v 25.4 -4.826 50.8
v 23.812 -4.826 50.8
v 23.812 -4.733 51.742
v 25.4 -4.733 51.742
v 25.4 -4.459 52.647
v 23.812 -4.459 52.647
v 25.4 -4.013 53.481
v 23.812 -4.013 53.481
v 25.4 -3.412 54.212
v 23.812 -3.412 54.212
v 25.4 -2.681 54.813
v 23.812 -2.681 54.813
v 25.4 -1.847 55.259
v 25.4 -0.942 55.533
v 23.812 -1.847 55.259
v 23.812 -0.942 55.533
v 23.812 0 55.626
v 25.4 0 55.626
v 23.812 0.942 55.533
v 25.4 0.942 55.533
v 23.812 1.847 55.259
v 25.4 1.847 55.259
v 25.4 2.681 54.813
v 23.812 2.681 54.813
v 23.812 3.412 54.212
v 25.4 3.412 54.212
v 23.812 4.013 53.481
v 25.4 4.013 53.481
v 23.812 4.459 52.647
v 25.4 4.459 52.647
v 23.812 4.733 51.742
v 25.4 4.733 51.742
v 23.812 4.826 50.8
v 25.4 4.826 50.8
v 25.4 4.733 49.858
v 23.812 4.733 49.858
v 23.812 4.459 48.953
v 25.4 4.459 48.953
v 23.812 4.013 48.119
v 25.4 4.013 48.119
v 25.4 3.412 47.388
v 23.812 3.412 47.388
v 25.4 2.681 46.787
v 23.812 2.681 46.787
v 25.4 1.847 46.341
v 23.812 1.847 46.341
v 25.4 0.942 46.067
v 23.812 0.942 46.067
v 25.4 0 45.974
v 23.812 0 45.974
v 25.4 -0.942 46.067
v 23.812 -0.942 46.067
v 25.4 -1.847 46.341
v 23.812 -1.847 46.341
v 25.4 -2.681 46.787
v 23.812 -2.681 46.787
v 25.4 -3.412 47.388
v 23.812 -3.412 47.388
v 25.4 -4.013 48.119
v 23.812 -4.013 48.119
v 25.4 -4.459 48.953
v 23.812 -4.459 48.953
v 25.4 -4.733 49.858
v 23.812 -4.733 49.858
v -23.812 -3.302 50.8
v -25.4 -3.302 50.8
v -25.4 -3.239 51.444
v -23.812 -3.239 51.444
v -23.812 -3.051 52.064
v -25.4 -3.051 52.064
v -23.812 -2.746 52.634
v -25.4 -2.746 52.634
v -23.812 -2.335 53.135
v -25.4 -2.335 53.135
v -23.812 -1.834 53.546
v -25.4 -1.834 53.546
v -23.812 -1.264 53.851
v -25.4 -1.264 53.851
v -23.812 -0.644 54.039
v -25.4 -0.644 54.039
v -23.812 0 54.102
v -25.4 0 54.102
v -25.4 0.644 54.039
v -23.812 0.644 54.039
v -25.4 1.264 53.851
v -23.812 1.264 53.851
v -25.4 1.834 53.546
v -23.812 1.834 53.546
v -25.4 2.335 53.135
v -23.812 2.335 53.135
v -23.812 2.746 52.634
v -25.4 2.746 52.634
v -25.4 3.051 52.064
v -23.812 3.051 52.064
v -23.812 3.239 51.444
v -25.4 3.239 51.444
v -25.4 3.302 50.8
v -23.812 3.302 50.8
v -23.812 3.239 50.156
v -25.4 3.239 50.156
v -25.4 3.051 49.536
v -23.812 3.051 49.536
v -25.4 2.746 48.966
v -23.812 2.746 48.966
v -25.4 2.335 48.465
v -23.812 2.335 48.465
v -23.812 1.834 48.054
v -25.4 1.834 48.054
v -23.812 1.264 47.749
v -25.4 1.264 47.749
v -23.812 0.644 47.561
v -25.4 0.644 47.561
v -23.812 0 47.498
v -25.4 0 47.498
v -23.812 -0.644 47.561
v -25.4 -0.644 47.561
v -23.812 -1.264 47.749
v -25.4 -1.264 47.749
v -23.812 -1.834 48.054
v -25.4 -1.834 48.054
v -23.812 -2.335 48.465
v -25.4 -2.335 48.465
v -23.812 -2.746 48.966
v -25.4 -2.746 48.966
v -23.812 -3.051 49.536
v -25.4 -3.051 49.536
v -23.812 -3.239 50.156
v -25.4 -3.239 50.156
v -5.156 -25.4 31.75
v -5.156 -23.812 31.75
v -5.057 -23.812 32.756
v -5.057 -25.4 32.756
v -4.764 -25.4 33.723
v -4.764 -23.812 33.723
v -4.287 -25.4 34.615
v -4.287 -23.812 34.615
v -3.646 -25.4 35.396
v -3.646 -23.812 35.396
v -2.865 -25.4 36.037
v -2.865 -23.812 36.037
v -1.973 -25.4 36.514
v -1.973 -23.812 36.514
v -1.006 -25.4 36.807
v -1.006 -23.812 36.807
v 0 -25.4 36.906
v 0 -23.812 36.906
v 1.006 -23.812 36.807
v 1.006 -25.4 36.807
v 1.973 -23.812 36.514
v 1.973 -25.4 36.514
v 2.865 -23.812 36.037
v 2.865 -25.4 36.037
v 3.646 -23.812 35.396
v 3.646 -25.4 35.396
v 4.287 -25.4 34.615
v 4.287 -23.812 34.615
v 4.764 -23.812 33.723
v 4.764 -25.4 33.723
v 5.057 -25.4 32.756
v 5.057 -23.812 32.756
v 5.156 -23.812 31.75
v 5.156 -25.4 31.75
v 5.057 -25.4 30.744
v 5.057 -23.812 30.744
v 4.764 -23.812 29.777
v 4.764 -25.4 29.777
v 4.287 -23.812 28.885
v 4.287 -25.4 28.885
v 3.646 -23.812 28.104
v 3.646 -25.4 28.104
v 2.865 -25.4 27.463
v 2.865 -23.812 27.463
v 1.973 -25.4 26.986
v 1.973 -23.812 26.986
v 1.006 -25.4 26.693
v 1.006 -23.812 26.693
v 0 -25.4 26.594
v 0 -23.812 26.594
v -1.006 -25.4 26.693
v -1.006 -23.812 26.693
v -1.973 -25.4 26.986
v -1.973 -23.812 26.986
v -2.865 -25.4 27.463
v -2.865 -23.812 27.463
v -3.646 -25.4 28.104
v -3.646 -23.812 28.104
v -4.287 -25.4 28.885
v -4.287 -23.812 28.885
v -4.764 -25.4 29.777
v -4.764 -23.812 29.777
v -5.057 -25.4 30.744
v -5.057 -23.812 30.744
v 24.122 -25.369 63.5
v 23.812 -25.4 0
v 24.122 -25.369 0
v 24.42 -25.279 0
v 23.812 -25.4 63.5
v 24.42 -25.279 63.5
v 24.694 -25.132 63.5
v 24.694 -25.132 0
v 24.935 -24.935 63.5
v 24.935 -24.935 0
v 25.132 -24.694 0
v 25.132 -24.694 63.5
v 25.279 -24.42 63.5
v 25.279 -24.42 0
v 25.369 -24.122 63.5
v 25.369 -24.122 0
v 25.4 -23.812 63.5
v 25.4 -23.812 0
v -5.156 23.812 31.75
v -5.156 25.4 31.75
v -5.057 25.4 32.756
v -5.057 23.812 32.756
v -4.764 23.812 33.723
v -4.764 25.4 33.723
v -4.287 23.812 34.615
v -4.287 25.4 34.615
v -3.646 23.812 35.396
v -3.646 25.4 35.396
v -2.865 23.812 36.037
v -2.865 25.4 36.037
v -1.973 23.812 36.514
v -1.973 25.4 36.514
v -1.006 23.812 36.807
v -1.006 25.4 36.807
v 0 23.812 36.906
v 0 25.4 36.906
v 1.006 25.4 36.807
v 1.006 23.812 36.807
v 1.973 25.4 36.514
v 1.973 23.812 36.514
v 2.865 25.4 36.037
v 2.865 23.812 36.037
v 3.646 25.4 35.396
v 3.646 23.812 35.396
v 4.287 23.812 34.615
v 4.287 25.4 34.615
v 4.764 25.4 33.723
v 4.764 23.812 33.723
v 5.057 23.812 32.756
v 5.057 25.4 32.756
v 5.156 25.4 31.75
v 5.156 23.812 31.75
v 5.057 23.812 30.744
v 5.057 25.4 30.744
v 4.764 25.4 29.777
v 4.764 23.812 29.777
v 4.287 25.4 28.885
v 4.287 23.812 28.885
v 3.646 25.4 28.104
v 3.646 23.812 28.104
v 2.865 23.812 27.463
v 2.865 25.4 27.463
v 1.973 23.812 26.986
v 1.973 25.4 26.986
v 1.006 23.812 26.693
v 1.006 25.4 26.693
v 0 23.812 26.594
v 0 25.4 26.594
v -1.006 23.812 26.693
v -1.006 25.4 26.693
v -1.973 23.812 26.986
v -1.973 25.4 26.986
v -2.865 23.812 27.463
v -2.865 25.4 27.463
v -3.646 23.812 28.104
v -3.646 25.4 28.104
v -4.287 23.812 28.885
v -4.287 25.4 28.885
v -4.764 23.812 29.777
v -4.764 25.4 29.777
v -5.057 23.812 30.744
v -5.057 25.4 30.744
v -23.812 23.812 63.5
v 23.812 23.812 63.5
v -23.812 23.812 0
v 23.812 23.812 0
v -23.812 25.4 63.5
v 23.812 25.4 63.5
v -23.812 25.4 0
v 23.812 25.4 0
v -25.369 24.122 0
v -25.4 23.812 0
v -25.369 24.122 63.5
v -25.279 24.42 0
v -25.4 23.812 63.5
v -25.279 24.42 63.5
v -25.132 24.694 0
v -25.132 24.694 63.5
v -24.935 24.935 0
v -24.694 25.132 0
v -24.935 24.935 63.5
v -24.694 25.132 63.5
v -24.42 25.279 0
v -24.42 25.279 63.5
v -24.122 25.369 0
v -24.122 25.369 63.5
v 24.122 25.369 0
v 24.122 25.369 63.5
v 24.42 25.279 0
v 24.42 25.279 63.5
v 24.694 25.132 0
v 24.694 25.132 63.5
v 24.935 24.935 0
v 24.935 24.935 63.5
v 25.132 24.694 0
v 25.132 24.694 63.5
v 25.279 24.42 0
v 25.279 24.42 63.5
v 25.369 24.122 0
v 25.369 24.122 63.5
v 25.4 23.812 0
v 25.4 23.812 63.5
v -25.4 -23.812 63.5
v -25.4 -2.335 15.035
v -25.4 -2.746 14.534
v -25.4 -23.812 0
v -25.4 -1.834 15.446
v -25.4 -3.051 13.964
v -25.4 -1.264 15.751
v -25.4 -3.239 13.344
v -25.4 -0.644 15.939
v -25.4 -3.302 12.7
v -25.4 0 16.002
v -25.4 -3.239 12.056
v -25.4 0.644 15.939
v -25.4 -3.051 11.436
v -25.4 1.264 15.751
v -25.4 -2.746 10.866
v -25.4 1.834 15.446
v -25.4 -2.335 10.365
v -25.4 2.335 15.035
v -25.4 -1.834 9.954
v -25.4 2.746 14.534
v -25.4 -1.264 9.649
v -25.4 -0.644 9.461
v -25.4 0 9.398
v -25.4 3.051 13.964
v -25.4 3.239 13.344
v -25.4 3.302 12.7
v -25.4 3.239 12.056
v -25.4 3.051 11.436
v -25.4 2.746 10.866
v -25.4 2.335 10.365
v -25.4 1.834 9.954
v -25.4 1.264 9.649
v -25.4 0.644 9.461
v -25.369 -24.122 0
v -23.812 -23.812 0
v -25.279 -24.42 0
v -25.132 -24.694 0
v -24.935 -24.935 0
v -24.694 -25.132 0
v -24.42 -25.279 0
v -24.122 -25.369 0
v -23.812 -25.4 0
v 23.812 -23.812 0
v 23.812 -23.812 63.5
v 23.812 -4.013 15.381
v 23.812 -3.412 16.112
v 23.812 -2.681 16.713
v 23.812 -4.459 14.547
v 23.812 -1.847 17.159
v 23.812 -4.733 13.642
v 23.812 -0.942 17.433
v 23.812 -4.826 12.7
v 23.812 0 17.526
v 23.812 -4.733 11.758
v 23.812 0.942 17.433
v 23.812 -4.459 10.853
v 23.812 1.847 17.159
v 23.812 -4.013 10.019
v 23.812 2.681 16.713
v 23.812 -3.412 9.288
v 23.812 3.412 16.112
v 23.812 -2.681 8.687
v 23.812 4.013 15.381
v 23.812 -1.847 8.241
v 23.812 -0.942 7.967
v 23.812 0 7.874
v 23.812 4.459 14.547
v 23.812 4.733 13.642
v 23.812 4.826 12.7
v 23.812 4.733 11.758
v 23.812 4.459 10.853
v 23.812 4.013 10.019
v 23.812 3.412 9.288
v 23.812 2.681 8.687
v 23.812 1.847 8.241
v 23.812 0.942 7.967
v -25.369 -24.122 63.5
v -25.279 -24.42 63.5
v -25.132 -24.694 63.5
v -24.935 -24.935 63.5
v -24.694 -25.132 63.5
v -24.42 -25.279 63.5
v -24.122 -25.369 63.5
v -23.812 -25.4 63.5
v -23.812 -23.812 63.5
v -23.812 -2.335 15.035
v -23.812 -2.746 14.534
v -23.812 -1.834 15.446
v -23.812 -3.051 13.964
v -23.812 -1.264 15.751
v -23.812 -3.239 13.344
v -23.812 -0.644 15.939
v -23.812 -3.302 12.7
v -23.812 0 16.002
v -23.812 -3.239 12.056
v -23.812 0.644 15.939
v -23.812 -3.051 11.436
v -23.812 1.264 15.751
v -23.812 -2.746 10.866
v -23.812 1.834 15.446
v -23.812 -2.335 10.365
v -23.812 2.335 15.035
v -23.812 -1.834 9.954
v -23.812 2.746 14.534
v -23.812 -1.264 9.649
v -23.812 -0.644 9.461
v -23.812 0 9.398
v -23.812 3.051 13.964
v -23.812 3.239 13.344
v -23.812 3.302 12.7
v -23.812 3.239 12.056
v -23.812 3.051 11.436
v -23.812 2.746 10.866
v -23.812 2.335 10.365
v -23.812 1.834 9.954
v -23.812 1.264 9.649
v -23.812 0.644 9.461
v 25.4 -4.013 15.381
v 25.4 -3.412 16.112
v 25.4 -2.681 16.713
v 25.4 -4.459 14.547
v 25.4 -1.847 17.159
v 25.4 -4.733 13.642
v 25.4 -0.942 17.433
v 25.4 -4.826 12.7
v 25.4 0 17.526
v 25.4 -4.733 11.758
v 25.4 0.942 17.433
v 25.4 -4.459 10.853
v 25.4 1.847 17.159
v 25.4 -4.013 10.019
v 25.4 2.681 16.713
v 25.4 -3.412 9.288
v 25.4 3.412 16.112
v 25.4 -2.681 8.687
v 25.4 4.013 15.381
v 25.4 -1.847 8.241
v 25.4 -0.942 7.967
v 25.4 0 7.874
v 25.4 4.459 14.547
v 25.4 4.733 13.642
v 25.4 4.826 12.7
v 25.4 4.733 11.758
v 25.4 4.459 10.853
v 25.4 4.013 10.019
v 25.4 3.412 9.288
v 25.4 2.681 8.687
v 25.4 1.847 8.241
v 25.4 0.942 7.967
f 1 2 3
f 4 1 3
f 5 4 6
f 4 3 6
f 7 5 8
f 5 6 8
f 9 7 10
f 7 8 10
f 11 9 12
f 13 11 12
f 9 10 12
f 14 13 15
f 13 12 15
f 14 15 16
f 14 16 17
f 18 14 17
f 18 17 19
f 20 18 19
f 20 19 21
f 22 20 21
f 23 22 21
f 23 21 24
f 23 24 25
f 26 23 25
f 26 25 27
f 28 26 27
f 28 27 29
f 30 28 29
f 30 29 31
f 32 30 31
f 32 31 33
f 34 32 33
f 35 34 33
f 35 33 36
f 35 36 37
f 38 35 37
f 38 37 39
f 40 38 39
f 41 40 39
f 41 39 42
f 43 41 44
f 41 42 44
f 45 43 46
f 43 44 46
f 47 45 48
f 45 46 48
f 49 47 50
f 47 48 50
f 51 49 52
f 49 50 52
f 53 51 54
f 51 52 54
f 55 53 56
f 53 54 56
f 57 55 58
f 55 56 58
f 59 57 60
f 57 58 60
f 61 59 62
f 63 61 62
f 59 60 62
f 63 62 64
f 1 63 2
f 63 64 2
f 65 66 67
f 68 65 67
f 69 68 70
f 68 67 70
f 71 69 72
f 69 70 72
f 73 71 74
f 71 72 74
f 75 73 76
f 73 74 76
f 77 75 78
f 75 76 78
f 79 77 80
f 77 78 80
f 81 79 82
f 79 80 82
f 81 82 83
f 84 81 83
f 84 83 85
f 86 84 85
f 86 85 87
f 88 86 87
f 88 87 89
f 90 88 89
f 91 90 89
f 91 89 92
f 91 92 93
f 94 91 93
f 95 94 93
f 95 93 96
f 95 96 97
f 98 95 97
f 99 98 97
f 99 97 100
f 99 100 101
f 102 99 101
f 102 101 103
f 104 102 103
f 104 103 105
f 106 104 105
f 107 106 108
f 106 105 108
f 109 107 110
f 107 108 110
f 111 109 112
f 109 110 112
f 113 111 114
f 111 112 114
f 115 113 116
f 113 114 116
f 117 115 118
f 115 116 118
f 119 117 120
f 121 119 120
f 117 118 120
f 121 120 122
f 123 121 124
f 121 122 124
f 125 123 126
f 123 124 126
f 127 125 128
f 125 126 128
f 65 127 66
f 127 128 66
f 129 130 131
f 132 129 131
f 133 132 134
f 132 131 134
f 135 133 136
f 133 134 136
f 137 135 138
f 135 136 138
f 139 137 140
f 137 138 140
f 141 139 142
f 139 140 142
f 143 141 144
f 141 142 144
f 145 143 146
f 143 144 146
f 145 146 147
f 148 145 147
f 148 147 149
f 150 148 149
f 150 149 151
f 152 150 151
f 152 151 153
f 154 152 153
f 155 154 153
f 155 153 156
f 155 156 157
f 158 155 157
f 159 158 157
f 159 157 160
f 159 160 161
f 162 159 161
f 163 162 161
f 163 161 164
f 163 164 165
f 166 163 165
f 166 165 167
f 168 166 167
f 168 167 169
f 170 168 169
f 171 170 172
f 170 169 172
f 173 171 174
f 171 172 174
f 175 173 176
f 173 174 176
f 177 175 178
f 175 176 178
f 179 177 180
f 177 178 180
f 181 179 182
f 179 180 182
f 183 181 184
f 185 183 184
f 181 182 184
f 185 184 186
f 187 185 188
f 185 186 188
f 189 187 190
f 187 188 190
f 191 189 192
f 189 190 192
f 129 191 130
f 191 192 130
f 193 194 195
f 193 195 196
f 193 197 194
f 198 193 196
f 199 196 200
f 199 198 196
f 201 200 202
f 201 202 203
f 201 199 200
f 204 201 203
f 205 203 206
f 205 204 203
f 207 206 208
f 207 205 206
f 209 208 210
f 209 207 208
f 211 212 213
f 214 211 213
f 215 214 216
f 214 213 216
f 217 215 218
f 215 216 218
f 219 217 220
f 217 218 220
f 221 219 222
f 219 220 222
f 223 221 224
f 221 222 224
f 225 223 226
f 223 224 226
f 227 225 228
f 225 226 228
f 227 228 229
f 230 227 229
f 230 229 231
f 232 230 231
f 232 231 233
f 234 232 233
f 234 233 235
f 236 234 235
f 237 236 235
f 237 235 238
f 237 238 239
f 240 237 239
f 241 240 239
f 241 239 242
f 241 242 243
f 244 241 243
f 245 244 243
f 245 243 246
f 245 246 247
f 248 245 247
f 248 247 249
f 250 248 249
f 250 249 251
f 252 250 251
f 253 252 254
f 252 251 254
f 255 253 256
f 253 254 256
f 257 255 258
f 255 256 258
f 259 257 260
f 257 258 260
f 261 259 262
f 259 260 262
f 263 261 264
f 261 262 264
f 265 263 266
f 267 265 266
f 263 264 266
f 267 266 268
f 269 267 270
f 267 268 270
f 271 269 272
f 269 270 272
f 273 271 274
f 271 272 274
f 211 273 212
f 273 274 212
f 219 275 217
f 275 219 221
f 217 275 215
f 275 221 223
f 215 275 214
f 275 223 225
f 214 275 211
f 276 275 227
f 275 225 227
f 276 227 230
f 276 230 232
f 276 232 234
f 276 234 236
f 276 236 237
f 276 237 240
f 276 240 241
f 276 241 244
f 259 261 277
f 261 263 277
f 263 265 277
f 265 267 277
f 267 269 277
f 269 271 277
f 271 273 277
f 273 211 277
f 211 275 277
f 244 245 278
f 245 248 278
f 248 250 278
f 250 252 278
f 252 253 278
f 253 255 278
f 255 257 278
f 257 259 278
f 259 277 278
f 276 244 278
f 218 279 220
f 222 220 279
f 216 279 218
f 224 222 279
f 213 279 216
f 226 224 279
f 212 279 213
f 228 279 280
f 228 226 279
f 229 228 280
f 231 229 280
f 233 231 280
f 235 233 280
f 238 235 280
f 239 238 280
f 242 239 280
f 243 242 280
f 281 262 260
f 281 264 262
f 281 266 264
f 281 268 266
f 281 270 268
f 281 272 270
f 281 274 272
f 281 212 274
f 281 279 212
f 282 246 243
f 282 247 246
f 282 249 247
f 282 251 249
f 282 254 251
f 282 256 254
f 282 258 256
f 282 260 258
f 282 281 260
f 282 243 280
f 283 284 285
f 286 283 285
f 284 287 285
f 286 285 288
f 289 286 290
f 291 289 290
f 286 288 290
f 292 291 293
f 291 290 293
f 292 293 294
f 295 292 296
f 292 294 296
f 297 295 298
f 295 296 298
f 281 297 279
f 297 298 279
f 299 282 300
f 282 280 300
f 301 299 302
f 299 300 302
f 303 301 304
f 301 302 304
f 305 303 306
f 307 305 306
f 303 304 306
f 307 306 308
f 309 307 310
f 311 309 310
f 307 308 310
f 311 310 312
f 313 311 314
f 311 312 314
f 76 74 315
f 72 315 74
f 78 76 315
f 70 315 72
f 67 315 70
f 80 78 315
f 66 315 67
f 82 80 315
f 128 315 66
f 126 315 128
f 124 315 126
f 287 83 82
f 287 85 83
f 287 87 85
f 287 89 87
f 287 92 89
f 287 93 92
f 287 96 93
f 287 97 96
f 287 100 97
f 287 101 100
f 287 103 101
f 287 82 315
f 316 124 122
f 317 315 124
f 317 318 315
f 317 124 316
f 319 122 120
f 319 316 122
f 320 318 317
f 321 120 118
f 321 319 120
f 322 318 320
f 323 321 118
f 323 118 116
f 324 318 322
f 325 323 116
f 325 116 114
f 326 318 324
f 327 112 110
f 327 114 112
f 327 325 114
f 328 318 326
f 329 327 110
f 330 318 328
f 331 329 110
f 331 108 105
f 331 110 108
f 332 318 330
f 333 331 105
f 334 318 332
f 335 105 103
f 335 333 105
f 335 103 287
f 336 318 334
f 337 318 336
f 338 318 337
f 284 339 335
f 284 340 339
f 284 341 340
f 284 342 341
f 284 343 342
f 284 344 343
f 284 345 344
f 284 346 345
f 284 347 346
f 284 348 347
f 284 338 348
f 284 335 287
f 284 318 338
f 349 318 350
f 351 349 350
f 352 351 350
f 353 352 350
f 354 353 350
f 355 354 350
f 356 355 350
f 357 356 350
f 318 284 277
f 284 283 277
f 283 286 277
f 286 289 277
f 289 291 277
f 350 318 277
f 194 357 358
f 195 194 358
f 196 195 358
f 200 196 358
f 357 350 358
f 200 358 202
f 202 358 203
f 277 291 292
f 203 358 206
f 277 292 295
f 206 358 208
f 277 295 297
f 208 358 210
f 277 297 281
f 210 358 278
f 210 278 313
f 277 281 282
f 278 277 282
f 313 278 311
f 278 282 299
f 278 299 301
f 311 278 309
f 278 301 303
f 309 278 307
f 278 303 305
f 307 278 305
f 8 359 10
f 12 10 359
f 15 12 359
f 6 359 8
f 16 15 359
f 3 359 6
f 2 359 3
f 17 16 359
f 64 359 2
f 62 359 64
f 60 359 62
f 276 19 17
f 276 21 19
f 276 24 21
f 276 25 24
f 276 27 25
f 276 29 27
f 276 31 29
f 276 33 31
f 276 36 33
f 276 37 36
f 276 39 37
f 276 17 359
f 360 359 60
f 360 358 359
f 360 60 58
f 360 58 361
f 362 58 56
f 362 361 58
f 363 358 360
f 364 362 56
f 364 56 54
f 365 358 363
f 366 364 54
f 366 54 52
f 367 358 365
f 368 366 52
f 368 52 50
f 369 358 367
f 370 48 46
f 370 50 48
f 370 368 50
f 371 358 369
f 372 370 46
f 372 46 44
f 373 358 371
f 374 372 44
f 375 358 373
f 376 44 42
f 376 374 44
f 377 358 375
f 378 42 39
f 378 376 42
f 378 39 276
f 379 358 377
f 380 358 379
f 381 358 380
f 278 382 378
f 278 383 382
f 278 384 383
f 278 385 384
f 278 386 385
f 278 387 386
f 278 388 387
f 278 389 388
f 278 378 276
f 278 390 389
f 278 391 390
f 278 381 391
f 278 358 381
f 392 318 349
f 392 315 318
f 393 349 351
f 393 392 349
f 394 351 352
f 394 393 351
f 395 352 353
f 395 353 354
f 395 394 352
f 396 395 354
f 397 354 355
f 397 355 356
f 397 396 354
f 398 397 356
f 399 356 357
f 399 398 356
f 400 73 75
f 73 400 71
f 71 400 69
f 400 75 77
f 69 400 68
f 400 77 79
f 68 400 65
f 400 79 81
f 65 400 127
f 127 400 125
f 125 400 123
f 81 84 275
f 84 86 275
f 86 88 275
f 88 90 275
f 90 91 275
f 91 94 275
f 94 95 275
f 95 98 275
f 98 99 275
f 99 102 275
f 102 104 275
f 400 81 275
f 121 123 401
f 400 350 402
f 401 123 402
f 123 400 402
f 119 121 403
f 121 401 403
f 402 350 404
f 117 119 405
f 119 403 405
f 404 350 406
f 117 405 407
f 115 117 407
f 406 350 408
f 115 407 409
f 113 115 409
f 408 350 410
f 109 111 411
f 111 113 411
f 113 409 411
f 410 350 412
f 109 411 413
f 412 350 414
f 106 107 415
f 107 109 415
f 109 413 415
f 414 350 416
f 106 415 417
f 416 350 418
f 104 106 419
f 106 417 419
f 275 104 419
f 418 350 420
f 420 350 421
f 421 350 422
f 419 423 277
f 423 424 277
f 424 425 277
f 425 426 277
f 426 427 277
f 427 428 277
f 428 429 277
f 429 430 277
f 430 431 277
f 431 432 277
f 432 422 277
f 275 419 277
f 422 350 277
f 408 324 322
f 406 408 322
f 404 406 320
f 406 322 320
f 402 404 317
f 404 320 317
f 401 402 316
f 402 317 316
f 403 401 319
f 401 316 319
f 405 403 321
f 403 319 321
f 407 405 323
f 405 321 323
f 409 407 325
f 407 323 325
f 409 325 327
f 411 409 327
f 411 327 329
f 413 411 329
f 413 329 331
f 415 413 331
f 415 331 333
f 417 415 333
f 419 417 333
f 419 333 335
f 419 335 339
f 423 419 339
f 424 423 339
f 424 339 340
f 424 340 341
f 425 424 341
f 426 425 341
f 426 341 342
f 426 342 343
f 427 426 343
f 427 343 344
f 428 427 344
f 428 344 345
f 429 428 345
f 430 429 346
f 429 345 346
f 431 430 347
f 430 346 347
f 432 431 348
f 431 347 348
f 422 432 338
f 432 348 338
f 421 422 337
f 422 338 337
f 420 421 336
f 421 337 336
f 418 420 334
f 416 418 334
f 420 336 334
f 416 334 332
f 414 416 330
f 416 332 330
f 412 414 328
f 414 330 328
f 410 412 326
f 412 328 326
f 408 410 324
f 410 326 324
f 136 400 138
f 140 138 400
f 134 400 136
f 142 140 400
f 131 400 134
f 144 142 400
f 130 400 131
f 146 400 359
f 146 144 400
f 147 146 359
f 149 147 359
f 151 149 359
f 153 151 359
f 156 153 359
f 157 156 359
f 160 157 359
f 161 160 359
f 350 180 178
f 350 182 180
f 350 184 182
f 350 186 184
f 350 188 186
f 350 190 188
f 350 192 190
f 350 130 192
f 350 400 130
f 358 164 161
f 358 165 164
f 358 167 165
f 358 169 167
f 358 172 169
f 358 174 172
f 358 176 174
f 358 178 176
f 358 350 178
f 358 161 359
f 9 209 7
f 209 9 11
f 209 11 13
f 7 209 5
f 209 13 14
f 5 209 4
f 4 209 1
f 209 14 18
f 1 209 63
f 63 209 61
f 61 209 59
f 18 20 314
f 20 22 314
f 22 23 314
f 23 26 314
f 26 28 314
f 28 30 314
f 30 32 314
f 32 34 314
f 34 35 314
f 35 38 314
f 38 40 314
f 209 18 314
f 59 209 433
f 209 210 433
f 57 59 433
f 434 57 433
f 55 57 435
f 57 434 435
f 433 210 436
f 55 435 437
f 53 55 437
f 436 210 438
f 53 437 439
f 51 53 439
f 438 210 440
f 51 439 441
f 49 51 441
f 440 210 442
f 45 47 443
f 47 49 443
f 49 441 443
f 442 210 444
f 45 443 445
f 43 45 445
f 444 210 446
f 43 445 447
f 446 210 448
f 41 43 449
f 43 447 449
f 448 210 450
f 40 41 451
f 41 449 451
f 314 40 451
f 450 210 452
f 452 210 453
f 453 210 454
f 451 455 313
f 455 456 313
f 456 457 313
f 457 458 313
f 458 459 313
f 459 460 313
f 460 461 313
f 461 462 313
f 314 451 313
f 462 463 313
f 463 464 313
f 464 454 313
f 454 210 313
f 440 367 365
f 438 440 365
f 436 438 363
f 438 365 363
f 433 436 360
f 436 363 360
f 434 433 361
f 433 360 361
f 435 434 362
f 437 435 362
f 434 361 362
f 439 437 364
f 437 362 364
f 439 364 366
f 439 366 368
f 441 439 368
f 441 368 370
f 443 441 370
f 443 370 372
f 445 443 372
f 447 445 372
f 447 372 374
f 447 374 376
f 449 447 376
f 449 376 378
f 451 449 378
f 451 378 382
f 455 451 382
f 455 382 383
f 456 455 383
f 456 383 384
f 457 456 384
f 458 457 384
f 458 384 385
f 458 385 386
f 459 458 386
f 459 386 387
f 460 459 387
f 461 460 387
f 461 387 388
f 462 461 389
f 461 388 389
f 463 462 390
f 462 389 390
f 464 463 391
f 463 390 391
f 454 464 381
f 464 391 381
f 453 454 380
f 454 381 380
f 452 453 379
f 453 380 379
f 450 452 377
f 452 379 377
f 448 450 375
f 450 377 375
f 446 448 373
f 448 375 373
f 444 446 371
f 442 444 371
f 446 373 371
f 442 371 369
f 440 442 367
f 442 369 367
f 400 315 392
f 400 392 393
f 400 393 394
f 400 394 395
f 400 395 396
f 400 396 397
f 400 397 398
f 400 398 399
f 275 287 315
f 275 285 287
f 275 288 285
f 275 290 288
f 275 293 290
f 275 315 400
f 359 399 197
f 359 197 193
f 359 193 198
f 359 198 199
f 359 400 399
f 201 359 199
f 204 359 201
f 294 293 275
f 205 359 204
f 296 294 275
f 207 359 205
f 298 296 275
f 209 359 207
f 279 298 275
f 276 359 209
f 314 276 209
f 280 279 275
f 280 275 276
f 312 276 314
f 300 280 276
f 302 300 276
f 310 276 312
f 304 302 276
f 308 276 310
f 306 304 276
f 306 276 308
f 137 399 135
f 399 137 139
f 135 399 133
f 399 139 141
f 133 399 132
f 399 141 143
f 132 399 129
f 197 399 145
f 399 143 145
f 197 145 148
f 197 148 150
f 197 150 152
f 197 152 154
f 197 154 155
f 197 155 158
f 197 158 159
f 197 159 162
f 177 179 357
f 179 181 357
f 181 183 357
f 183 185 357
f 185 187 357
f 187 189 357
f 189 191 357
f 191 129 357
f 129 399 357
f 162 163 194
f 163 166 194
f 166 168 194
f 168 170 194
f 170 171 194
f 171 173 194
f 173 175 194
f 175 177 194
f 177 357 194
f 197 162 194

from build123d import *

# Parameters (mm, degrees)
F0_W     = 50.8
F0_H     = 50.8
F0_W_2   = 47.625
F0_H_2   = 47.625
F1_DEPTH = 63.5
F2_R     = 1.5875
F4_D     = 6.604
F6_D     = 9.652
F6_DEPTH = 12.7
F6_TIP   = 2.8997533474
F8_D     = 10.3124


with BuildPart() as f1:
    # F0 (on Top) → F1 (new body)
    with BuildSketch(Plane.XY):
        Rectangle(F0_W, F0_H)
        Rectangle(F0_W_2, F0_H_2, mode=Mode.SUBTRACT)
    extrude(amount=F1_DEPTH)

    # F2
    f2_edges = [f1.edges().sort_by_distance(p)[0] for p in [
        (25.4, -25.4, 31.75),
        (25.4, 25.4, 31.75),
        (-25.4, -25.4, 31.75),
        (-25.4, 25.4, 31.75),
    ]]
    fillet(f2_edges, radius=F2_R)

    # F4 (through all)
    with Locations(Plane.YZ.offset(25.4)):
        with Locations((0, 12.7), (0, 50.8)):
            Hole(F4_D / 2)

    # F6
    with Locations(Plane.YZ.offset(25.4)):
        with Locations((0, 50.8), (0, 12.7)):
            Hole(F6_D / 2, depth=F6_DEPTH)
            with Locations((0, 0, -(F6_DEPTH + F6_TIP / 2))):  # 118° drill point
                Cone(0, F6_D / 2, F6_TIP, mode=Mode.SUBTRACT)

    # F8 (through all)
    with Locations(Plane.XZ.offset(25.4)):
        with Locations((0, 31.75)):
            Hole(F8_D / 2)


solid = f1.part
